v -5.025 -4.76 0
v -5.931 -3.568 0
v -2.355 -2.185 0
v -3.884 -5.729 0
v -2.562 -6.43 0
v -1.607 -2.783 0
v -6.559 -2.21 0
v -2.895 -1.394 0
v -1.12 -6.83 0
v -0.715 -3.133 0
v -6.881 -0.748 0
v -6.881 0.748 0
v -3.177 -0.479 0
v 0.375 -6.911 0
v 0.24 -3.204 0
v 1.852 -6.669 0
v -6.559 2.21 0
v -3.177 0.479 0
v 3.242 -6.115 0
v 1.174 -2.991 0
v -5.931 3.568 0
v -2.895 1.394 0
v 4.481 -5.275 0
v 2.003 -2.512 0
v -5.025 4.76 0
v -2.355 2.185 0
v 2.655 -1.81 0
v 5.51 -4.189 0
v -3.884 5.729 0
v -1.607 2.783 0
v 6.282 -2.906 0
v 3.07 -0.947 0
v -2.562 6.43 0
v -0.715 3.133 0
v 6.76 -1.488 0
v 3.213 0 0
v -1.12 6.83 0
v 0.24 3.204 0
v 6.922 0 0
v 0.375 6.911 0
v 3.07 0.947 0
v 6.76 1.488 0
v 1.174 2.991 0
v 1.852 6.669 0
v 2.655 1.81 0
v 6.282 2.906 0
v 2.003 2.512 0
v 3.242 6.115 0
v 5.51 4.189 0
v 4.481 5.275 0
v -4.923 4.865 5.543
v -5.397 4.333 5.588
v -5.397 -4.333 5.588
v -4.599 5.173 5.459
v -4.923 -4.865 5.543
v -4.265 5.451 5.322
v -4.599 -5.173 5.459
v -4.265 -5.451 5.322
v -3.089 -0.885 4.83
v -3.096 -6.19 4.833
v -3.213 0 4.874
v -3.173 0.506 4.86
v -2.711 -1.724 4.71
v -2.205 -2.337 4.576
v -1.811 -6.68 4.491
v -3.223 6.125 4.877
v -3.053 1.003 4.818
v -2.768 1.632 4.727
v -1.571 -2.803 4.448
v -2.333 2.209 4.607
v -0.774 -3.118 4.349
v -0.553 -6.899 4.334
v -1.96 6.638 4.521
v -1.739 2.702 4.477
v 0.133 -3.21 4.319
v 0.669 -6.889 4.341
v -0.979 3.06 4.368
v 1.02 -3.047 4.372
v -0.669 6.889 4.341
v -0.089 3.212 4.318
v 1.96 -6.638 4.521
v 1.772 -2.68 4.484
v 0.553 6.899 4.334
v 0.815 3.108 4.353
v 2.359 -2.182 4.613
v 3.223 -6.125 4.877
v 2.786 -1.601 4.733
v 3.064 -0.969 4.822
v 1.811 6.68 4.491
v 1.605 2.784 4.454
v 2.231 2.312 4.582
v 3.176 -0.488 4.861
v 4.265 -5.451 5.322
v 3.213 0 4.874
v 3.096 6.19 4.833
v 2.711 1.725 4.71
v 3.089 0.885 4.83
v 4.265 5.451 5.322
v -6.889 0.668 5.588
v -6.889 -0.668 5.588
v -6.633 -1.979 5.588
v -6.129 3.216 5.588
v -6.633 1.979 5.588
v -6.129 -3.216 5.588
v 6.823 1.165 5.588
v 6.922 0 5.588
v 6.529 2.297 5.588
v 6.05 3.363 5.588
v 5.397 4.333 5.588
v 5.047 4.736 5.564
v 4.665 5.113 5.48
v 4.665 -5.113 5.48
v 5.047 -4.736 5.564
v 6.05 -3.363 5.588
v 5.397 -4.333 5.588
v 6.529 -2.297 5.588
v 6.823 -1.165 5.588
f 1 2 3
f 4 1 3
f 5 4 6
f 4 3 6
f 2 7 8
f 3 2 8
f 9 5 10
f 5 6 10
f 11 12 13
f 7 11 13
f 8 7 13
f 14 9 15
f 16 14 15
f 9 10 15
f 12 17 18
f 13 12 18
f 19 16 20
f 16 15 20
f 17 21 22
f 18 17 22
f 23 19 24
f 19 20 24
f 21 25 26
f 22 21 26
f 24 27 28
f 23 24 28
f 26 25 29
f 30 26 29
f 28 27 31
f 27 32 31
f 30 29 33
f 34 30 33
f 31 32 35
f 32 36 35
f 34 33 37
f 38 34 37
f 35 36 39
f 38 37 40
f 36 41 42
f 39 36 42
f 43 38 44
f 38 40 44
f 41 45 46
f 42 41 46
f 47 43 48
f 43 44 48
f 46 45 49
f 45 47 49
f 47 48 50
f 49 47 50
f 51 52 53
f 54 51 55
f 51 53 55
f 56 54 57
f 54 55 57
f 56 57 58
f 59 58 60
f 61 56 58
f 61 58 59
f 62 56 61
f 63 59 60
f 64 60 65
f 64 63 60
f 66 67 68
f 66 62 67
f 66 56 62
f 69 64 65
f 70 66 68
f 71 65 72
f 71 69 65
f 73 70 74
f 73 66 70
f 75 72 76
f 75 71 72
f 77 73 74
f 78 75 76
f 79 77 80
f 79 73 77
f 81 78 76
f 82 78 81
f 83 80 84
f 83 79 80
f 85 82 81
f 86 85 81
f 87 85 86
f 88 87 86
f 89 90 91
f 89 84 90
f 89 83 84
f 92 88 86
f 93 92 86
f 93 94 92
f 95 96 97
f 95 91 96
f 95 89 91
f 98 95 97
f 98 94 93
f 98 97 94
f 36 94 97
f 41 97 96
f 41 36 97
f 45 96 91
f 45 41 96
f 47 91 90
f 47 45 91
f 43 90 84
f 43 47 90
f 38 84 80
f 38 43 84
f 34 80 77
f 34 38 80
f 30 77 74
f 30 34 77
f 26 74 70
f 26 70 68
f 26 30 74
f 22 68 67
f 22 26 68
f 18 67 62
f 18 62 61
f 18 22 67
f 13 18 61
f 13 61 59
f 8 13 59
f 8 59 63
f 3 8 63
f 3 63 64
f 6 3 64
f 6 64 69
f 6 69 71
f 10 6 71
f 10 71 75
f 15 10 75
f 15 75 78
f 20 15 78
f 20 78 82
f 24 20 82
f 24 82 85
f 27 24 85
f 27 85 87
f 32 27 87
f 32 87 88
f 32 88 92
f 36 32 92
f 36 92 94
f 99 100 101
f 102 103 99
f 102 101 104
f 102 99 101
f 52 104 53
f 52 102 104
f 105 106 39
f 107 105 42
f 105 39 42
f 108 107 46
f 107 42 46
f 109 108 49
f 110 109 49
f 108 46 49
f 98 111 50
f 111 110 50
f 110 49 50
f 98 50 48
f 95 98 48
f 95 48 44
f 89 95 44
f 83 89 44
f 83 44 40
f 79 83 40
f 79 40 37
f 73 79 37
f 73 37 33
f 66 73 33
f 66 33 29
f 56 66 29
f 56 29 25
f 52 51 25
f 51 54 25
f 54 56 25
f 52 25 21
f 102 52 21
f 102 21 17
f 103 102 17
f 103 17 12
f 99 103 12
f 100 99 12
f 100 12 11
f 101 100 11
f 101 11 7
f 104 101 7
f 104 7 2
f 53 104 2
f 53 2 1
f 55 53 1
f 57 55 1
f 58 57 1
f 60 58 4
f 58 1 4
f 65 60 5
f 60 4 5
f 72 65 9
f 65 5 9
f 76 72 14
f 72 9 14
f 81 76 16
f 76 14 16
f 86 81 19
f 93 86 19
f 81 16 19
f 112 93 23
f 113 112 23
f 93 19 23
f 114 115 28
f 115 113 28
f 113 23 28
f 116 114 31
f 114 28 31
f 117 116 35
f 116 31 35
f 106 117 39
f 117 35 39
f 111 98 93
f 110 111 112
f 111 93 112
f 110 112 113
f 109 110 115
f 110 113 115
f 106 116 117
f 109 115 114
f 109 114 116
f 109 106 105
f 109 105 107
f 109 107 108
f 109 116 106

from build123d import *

# Parameters (mm, degrees)
F0_R          = 6.9215
F0_R_2        = 3.2131
F1_DEPTH      = 5.588
F3_DEPTH      = 6.9225
F3_DEPTH_BACK = 6.9225
F4_R          = 2.54


with BuildPart() as f1:
    # F0 (on Top) → F1 (new body)
    with BuildSketch(Plane.XY):
        Circle(F0_R)
        Circle(F0_R_2, mode=Mode.SUBTRACT)
    extrude(amount=F1_DEPTH)

    # F2 (on Front) → F3 (cut, two sides)
    with BuildSketch(Plane.XZ) as f3_sk:
        with BuildLine():
            Line((4.7625, 5.588), (-4.7625, 5.588))
            ThreePointArc((-4.7625, 5.588), (0, 4.318), (4.7625, 5.588))
        make_face()
    extrude(amount=-F3_DEPTH, mode=Mode.SUBTRACT)
    extrude(f3_sk.sketch, amount=F3_DEPTH_BACK, mode=Mode.SUBTRACT)

    # F4
    f4_edges = [f1.edges().sort_by_distance(p)[0] for p in [
        (-4.7625, 0, 5.588),
        (4.7625, 0, 5.588),
    ]]
    fillet(f4_edges, radius=F4_R)


solid = f1.part
